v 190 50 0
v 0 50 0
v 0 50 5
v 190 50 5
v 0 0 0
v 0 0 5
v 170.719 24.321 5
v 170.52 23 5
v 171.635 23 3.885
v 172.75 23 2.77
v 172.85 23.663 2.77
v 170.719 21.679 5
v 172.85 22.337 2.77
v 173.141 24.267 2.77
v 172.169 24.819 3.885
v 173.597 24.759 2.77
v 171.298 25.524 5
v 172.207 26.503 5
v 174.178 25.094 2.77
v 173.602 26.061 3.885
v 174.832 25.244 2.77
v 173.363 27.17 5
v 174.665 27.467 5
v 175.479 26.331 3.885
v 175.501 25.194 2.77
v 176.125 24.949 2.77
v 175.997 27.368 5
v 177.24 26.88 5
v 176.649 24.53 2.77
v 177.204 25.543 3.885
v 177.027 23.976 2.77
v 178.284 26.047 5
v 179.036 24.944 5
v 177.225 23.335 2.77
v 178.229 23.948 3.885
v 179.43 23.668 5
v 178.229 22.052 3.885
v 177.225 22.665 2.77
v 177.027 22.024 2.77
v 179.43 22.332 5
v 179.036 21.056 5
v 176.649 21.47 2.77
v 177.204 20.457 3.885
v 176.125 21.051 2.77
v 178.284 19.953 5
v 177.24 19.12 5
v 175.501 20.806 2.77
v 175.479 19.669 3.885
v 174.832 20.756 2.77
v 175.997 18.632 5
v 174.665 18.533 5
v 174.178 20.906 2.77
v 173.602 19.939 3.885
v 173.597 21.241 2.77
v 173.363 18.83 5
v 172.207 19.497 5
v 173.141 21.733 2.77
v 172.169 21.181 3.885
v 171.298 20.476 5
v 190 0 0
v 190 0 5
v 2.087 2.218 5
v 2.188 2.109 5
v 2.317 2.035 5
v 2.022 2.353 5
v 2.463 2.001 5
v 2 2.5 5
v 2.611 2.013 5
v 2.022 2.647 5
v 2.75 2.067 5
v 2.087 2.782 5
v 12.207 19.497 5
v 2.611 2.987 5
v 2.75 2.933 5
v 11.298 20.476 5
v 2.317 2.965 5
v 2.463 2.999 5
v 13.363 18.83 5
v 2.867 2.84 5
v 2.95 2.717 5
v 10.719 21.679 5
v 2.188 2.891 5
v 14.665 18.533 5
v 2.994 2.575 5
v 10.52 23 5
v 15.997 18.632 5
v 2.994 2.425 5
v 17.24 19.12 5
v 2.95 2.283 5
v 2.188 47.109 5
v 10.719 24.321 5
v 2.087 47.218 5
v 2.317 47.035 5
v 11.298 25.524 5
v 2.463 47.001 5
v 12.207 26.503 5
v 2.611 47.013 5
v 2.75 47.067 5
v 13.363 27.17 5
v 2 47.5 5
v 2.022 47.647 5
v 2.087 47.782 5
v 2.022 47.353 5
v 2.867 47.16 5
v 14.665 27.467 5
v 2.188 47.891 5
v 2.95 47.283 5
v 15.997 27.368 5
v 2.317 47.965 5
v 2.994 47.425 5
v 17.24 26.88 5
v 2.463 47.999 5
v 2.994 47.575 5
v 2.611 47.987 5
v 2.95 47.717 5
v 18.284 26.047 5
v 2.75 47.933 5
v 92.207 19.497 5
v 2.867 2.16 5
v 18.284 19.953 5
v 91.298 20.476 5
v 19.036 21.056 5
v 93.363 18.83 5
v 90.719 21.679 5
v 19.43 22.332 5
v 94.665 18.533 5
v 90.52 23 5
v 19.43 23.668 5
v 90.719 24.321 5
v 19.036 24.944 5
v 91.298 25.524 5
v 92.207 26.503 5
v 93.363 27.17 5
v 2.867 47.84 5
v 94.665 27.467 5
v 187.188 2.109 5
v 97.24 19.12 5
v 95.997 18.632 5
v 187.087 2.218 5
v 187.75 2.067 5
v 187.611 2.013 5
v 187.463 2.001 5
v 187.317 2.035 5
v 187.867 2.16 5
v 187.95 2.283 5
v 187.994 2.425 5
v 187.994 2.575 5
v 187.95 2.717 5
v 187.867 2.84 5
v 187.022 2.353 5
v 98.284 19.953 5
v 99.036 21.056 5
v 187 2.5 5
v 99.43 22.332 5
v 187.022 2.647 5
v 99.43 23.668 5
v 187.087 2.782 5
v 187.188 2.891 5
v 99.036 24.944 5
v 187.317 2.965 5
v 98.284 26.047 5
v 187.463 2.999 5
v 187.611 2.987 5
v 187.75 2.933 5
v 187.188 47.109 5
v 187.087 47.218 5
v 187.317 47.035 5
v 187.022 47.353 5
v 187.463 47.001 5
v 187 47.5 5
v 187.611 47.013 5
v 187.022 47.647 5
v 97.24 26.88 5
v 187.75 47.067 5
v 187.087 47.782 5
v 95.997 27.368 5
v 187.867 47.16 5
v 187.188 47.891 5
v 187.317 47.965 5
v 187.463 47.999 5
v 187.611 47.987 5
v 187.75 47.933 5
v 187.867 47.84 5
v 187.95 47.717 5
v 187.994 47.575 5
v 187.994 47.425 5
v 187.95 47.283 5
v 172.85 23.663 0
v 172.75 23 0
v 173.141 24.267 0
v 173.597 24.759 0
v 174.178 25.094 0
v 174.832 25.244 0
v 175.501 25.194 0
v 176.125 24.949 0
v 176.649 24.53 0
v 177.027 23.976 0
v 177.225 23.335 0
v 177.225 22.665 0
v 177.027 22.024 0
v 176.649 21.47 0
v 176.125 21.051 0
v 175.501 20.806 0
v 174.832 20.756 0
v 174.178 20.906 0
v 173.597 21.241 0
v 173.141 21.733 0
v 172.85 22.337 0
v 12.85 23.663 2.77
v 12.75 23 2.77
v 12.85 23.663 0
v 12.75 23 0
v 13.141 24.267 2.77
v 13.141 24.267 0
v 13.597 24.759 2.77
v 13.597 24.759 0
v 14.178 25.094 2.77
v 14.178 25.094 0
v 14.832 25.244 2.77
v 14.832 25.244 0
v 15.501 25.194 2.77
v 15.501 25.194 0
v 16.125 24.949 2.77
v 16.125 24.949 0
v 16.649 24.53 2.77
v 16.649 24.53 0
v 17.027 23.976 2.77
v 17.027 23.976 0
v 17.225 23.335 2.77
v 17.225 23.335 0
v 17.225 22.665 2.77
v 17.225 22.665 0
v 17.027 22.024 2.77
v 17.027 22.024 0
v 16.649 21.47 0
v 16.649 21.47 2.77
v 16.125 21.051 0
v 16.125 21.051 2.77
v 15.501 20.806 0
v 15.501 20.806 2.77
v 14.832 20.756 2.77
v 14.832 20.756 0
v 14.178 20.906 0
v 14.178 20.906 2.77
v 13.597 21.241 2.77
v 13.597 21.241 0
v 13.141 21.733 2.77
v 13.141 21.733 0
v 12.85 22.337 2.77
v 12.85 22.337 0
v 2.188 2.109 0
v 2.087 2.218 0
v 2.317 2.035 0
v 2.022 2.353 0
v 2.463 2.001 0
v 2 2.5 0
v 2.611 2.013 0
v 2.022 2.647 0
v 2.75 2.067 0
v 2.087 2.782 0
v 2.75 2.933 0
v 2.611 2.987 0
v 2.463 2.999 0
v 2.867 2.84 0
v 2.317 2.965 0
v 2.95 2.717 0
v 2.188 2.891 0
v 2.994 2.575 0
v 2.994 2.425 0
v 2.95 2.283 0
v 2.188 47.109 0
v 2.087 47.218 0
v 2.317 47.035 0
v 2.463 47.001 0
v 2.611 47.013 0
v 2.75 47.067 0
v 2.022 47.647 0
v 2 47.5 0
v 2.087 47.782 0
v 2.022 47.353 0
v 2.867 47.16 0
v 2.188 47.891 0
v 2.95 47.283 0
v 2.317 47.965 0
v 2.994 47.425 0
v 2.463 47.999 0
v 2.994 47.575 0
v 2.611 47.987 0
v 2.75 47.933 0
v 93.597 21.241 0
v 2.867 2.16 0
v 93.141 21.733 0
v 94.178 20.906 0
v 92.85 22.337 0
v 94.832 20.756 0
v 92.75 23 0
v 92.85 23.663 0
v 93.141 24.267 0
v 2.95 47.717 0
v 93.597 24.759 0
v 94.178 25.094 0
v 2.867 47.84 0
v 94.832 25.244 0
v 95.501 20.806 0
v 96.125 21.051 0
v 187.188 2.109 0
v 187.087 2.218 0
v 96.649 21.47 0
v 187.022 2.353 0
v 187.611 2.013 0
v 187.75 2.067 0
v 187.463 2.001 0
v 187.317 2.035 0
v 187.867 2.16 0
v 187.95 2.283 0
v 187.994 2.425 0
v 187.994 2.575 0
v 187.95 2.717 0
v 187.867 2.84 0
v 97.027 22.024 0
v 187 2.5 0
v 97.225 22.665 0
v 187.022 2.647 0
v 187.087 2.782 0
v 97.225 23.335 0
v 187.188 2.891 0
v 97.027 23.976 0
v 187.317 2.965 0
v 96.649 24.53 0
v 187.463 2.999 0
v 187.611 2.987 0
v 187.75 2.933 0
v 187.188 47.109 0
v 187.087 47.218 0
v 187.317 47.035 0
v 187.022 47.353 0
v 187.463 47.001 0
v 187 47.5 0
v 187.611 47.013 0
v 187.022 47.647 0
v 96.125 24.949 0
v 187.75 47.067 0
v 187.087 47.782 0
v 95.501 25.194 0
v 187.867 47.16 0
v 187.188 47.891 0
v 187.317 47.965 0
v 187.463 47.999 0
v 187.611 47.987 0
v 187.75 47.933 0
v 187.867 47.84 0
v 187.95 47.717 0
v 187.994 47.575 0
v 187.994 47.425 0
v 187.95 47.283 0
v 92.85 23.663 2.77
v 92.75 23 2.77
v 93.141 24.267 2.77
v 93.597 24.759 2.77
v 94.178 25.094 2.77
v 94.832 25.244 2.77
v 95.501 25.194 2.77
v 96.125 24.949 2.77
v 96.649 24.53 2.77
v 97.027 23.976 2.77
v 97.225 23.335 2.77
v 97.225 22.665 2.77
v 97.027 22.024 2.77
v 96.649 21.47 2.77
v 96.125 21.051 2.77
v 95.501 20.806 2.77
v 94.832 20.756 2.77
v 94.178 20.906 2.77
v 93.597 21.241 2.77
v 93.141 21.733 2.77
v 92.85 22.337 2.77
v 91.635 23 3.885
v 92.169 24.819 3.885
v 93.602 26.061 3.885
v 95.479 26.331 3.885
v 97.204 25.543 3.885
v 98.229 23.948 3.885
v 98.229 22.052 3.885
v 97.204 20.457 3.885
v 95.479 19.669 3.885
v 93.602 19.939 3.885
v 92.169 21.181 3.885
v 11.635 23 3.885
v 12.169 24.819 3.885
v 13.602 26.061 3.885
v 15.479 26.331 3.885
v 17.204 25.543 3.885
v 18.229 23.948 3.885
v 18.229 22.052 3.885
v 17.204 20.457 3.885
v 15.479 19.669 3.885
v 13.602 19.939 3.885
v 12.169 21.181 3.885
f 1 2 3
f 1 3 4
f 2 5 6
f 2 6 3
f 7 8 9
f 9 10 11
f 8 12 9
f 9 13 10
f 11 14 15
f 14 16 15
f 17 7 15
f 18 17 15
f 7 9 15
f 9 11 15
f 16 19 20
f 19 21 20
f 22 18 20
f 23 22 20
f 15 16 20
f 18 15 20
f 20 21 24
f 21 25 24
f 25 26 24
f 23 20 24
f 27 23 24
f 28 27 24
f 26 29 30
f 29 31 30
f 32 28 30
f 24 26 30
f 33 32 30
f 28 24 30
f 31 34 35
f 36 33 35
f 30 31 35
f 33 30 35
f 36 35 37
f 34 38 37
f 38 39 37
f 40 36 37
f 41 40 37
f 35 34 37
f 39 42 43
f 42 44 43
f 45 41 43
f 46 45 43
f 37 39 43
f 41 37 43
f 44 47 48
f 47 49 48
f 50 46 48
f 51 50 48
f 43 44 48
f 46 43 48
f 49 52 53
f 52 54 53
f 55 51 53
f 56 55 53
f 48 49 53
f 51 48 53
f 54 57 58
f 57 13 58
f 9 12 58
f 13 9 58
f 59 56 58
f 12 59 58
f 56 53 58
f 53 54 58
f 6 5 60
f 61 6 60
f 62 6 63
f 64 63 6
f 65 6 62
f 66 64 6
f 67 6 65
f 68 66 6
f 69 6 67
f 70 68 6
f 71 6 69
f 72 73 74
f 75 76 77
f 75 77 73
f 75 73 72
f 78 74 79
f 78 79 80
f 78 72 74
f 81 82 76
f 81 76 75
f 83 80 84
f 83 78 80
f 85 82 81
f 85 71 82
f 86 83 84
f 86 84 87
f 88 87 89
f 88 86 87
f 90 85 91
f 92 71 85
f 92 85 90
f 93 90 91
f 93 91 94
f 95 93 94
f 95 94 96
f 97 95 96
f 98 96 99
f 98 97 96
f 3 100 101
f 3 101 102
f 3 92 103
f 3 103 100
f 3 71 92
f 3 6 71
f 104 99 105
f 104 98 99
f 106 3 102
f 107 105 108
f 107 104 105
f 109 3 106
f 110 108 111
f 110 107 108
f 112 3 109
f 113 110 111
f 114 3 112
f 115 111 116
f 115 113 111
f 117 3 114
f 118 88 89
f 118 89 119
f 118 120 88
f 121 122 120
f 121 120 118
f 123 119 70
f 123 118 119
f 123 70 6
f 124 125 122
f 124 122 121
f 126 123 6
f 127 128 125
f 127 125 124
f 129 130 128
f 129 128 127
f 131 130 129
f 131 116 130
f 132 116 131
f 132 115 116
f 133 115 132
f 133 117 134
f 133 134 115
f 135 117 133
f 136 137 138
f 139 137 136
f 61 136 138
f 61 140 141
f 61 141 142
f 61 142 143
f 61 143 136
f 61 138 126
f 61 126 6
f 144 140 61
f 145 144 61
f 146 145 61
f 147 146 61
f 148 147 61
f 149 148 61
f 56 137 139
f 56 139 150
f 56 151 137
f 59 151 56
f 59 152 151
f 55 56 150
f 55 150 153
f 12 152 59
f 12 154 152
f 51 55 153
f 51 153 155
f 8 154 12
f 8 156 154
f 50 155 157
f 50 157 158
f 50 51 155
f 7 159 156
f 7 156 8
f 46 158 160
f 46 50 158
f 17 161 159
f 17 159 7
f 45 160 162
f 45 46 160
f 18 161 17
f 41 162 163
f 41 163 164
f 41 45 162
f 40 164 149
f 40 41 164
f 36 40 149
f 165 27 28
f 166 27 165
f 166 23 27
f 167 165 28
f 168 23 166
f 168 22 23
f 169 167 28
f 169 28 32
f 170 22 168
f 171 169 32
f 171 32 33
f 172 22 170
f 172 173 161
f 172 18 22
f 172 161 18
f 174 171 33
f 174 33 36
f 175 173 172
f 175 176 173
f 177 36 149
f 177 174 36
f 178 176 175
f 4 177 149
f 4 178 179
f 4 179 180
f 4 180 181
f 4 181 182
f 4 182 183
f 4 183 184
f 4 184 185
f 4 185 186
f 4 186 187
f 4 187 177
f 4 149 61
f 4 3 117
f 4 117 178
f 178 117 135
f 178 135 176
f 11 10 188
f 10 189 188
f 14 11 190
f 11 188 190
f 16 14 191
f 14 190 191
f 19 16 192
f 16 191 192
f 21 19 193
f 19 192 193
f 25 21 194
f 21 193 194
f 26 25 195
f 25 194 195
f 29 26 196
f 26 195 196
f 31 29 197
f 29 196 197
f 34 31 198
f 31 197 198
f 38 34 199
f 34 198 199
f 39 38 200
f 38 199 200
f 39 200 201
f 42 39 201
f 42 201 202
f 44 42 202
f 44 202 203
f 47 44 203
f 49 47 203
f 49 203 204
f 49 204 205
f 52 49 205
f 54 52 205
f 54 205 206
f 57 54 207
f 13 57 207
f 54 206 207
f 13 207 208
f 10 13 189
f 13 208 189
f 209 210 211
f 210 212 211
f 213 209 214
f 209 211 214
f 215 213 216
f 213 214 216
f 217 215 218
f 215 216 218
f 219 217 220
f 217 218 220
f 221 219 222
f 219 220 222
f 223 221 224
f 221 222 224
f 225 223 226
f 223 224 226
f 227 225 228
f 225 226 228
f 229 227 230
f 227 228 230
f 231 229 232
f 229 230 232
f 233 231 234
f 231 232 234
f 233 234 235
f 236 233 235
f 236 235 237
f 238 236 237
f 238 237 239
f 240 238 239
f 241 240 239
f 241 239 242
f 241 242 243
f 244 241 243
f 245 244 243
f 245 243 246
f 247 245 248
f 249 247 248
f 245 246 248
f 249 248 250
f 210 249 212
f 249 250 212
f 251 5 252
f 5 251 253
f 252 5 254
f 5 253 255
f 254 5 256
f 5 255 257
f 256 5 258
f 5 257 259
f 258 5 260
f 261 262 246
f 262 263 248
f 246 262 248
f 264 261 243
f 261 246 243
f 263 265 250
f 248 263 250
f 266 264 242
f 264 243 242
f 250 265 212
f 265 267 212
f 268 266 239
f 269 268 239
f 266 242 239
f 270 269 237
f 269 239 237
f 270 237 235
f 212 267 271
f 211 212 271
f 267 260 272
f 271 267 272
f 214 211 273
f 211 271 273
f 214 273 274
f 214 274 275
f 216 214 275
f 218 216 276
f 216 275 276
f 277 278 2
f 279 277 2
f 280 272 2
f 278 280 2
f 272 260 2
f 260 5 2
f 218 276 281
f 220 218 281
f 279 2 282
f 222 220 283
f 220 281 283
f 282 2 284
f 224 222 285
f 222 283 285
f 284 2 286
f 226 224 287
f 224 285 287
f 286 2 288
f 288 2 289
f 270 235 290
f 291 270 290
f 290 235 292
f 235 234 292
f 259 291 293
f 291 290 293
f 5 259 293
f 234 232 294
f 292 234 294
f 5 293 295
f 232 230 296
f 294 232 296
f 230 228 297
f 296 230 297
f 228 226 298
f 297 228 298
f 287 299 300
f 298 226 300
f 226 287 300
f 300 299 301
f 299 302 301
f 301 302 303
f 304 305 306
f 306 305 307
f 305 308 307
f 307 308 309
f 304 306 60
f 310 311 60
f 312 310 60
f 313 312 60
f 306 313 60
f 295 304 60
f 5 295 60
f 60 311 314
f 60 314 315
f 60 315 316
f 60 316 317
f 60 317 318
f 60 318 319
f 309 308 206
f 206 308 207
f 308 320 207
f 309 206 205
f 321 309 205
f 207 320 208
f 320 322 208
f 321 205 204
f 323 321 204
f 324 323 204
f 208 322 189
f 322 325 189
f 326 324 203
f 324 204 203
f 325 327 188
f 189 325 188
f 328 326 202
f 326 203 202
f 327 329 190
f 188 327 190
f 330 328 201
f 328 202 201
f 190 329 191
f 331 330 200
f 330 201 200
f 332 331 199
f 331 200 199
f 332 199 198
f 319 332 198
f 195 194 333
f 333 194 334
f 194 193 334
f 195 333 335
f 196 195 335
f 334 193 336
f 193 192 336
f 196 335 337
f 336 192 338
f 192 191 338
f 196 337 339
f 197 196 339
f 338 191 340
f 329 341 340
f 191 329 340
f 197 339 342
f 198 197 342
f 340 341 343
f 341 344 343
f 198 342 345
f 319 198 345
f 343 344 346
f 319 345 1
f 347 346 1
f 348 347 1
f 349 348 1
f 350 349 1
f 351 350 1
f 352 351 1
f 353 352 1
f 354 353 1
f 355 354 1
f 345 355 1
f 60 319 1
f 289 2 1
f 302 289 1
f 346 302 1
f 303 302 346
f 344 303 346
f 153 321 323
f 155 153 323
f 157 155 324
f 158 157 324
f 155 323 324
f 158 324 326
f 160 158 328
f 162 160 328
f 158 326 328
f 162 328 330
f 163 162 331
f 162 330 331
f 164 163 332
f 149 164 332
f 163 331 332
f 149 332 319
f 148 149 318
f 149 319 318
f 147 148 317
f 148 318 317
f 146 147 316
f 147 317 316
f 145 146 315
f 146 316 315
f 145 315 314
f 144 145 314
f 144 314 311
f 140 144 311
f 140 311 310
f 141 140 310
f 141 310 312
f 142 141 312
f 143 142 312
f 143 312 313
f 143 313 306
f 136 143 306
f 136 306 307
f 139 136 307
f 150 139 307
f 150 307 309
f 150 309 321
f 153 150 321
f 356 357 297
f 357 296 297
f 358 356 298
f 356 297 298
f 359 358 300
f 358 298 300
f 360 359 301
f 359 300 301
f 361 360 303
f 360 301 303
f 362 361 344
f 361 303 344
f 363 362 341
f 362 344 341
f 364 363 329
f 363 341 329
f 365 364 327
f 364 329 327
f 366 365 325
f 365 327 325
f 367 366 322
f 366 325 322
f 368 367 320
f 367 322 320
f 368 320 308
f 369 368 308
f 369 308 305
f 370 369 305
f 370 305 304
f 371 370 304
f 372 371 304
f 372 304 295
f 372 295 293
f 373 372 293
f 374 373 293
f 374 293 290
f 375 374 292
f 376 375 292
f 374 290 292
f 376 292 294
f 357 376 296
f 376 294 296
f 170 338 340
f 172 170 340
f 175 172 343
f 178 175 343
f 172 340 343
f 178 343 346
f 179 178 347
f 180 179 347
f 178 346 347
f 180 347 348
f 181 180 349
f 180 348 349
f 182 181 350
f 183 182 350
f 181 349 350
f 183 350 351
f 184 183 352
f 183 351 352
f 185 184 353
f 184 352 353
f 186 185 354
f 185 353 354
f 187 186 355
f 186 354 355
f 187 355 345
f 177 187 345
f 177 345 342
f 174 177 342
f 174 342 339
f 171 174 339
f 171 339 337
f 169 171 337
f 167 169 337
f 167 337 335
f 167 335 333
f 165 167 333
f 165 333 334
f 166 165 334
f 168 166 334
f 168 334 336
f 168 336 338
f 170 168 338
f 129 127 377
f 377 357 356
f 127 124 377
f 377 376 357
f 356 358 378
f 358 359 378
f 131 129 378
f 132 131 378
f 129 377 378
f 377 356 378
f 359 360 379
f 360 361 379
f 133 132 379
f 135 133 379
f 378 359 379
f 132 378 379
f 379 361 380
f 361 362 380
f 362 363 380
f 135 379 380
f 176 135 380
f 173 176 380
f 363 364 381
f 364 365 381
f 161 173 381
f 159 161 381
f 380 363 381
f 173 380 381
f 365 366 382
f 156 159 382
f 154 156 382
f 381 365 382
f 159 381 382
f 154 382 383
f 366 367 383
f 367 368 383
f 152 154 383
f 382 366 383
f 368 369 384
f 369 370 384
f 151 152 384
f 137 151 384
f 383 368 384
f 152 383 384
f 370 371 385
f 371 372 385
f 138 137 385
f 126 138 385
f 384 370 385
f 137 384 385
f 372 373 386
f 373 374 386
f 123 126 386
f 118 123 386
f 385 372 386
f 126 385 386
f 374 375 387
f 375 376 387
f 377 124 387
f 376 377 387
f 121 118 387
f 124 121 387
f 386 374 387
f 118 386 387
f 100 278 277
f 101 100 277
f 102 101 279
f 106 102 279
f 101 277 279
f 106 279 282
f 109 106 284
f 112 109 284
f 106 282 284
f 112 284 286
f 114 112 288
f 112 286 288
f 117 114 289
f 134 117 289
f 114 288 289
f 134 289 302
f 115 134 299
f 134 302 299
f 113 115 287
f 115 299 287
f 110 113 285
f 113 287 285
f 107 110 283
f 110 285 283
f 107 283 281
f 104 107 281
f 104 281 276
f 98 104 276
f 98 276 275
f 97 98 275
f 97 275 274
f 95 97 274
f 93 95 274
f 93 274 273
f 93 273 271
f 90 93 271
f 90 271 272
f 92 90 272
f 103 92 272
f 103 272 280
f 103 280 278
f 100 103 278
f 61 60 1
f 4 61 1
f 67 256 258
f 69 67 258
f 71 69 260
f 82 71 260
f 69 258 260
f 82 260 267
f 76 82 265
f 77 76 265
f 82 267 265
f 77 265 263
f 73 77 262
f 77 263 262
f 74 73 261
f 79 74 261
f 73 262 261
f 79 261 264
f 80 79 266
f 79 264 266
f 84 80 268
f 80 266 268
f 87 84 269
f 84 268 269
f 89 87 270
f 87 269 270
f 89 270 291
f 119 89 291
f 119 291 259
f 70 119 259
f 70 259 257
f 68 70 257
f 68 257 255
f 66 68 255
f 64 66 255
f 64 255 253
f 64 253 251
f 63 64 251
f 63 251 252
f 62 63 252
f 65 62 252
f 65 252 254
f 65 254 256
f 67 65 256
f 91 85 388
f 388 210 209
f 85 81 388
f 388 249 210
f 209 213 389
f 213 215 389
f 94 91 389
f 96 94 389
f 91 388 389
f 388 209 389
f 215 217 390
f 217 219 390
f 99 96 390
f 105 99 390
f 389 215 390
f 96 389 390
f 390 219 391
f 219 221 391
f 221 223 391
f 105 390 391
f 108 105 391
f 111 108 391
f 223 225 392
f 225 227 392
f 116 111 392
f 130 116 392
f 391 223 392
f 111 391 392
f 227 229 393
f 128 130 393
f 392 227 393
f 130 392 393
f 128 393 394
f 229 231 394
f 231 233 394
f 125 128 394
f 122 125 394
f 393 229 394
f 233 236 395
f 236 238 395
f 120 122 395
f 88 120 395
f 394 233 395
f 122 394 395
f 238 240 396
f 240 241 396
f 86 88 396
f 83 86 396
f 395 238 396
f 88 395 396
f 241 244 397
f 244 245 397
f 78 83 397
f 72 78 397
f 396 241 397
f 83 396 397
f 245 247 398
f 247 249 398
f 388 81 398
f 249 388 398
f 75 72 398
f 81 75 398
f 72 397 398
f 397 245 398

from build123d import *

# Parameters (mm, degrees)
ESBO_O1_W                            = 190
ESBO_O1_H                            = 50
RESSALTO_EXTRUS_O1_DEPTH             = 5
FURO_DE_DI_METRO_1_0_1_1_D           = 1
ESCAREADO_PARA_SFHCS_M41_D           = 4.5
ESCAREADO_PARA_SFHCS_M41_CSINK_D     = 8.96
ESCAREADO_PARA_SFHCS_M41_CSINK_ANGLE = 90
ESCAREADO_PARA_SFHCS_M42_D           = 4.5
ESCAREADO_PARA_SFHCS_M42_CSINK_D     = 8.96
ESCAREADO_PARA_SFHCS_M42_CSINK_ANGLE = 90


with BuildPart() as part:
    # Esboço1 → Ressalto-extrusão1 (new body)
    with BuildSketch(Plane.XY):
        with Locations((95, 25)):
            Rectangle(ESBO_O1_W, ESBO_O1_H)
    extrude(amount=RESSALTO_EXTRUS_O1_DEPTH)

    # Furo de diâmetro Ø1.0 (1)1 (through all)
    with Locations(Plane(origin=(2.5, 47.5, 5), x_dir=(1, 0, 0), z_dir=(0, 0, 1))):
        with Locations((0, 0), (0, -45), (185, -45), (185, 0)):
            Hole(FURO_DE_DI_METRO_1_0_1_1_D / 2)

    # Escareado para SFHCS M41 (through all)
    with Locations(Plane(origin=(15, 23, 5), x_dir=(1, 0, 0), z_dir=(0, 0, 1))):
        with Locations((0, 0), (80, 0)):
            CounterSinkHole(ESCAREADO_PARA_SFHCS_M41_D / 2, ESCAREADO_PARA_SFHCS_M41_CSINK_D / 2, counter_sink_angle=ESCAREADO_PARA_SFHCS_M41_CSINK_ANGLE)

    # Escareado para SFHCS M42 (through all)
    with Locations(Plane(origin=(175, 23, 5), x_dir=(1, 0, 0), z_dir=(0, 0, 1))):
        with Locations((0, 0)):
            CounterSinkHole(ESCAREADO_PARA_SFHCS_M42_D / 2, ESCAREADO_PARA_SFHCS_M42_CSINK_D / 2, counter_sink_angle=ESCAREADO_PARA_SFHCS_M42_CSINK_ANGLE)


solid = part.part
